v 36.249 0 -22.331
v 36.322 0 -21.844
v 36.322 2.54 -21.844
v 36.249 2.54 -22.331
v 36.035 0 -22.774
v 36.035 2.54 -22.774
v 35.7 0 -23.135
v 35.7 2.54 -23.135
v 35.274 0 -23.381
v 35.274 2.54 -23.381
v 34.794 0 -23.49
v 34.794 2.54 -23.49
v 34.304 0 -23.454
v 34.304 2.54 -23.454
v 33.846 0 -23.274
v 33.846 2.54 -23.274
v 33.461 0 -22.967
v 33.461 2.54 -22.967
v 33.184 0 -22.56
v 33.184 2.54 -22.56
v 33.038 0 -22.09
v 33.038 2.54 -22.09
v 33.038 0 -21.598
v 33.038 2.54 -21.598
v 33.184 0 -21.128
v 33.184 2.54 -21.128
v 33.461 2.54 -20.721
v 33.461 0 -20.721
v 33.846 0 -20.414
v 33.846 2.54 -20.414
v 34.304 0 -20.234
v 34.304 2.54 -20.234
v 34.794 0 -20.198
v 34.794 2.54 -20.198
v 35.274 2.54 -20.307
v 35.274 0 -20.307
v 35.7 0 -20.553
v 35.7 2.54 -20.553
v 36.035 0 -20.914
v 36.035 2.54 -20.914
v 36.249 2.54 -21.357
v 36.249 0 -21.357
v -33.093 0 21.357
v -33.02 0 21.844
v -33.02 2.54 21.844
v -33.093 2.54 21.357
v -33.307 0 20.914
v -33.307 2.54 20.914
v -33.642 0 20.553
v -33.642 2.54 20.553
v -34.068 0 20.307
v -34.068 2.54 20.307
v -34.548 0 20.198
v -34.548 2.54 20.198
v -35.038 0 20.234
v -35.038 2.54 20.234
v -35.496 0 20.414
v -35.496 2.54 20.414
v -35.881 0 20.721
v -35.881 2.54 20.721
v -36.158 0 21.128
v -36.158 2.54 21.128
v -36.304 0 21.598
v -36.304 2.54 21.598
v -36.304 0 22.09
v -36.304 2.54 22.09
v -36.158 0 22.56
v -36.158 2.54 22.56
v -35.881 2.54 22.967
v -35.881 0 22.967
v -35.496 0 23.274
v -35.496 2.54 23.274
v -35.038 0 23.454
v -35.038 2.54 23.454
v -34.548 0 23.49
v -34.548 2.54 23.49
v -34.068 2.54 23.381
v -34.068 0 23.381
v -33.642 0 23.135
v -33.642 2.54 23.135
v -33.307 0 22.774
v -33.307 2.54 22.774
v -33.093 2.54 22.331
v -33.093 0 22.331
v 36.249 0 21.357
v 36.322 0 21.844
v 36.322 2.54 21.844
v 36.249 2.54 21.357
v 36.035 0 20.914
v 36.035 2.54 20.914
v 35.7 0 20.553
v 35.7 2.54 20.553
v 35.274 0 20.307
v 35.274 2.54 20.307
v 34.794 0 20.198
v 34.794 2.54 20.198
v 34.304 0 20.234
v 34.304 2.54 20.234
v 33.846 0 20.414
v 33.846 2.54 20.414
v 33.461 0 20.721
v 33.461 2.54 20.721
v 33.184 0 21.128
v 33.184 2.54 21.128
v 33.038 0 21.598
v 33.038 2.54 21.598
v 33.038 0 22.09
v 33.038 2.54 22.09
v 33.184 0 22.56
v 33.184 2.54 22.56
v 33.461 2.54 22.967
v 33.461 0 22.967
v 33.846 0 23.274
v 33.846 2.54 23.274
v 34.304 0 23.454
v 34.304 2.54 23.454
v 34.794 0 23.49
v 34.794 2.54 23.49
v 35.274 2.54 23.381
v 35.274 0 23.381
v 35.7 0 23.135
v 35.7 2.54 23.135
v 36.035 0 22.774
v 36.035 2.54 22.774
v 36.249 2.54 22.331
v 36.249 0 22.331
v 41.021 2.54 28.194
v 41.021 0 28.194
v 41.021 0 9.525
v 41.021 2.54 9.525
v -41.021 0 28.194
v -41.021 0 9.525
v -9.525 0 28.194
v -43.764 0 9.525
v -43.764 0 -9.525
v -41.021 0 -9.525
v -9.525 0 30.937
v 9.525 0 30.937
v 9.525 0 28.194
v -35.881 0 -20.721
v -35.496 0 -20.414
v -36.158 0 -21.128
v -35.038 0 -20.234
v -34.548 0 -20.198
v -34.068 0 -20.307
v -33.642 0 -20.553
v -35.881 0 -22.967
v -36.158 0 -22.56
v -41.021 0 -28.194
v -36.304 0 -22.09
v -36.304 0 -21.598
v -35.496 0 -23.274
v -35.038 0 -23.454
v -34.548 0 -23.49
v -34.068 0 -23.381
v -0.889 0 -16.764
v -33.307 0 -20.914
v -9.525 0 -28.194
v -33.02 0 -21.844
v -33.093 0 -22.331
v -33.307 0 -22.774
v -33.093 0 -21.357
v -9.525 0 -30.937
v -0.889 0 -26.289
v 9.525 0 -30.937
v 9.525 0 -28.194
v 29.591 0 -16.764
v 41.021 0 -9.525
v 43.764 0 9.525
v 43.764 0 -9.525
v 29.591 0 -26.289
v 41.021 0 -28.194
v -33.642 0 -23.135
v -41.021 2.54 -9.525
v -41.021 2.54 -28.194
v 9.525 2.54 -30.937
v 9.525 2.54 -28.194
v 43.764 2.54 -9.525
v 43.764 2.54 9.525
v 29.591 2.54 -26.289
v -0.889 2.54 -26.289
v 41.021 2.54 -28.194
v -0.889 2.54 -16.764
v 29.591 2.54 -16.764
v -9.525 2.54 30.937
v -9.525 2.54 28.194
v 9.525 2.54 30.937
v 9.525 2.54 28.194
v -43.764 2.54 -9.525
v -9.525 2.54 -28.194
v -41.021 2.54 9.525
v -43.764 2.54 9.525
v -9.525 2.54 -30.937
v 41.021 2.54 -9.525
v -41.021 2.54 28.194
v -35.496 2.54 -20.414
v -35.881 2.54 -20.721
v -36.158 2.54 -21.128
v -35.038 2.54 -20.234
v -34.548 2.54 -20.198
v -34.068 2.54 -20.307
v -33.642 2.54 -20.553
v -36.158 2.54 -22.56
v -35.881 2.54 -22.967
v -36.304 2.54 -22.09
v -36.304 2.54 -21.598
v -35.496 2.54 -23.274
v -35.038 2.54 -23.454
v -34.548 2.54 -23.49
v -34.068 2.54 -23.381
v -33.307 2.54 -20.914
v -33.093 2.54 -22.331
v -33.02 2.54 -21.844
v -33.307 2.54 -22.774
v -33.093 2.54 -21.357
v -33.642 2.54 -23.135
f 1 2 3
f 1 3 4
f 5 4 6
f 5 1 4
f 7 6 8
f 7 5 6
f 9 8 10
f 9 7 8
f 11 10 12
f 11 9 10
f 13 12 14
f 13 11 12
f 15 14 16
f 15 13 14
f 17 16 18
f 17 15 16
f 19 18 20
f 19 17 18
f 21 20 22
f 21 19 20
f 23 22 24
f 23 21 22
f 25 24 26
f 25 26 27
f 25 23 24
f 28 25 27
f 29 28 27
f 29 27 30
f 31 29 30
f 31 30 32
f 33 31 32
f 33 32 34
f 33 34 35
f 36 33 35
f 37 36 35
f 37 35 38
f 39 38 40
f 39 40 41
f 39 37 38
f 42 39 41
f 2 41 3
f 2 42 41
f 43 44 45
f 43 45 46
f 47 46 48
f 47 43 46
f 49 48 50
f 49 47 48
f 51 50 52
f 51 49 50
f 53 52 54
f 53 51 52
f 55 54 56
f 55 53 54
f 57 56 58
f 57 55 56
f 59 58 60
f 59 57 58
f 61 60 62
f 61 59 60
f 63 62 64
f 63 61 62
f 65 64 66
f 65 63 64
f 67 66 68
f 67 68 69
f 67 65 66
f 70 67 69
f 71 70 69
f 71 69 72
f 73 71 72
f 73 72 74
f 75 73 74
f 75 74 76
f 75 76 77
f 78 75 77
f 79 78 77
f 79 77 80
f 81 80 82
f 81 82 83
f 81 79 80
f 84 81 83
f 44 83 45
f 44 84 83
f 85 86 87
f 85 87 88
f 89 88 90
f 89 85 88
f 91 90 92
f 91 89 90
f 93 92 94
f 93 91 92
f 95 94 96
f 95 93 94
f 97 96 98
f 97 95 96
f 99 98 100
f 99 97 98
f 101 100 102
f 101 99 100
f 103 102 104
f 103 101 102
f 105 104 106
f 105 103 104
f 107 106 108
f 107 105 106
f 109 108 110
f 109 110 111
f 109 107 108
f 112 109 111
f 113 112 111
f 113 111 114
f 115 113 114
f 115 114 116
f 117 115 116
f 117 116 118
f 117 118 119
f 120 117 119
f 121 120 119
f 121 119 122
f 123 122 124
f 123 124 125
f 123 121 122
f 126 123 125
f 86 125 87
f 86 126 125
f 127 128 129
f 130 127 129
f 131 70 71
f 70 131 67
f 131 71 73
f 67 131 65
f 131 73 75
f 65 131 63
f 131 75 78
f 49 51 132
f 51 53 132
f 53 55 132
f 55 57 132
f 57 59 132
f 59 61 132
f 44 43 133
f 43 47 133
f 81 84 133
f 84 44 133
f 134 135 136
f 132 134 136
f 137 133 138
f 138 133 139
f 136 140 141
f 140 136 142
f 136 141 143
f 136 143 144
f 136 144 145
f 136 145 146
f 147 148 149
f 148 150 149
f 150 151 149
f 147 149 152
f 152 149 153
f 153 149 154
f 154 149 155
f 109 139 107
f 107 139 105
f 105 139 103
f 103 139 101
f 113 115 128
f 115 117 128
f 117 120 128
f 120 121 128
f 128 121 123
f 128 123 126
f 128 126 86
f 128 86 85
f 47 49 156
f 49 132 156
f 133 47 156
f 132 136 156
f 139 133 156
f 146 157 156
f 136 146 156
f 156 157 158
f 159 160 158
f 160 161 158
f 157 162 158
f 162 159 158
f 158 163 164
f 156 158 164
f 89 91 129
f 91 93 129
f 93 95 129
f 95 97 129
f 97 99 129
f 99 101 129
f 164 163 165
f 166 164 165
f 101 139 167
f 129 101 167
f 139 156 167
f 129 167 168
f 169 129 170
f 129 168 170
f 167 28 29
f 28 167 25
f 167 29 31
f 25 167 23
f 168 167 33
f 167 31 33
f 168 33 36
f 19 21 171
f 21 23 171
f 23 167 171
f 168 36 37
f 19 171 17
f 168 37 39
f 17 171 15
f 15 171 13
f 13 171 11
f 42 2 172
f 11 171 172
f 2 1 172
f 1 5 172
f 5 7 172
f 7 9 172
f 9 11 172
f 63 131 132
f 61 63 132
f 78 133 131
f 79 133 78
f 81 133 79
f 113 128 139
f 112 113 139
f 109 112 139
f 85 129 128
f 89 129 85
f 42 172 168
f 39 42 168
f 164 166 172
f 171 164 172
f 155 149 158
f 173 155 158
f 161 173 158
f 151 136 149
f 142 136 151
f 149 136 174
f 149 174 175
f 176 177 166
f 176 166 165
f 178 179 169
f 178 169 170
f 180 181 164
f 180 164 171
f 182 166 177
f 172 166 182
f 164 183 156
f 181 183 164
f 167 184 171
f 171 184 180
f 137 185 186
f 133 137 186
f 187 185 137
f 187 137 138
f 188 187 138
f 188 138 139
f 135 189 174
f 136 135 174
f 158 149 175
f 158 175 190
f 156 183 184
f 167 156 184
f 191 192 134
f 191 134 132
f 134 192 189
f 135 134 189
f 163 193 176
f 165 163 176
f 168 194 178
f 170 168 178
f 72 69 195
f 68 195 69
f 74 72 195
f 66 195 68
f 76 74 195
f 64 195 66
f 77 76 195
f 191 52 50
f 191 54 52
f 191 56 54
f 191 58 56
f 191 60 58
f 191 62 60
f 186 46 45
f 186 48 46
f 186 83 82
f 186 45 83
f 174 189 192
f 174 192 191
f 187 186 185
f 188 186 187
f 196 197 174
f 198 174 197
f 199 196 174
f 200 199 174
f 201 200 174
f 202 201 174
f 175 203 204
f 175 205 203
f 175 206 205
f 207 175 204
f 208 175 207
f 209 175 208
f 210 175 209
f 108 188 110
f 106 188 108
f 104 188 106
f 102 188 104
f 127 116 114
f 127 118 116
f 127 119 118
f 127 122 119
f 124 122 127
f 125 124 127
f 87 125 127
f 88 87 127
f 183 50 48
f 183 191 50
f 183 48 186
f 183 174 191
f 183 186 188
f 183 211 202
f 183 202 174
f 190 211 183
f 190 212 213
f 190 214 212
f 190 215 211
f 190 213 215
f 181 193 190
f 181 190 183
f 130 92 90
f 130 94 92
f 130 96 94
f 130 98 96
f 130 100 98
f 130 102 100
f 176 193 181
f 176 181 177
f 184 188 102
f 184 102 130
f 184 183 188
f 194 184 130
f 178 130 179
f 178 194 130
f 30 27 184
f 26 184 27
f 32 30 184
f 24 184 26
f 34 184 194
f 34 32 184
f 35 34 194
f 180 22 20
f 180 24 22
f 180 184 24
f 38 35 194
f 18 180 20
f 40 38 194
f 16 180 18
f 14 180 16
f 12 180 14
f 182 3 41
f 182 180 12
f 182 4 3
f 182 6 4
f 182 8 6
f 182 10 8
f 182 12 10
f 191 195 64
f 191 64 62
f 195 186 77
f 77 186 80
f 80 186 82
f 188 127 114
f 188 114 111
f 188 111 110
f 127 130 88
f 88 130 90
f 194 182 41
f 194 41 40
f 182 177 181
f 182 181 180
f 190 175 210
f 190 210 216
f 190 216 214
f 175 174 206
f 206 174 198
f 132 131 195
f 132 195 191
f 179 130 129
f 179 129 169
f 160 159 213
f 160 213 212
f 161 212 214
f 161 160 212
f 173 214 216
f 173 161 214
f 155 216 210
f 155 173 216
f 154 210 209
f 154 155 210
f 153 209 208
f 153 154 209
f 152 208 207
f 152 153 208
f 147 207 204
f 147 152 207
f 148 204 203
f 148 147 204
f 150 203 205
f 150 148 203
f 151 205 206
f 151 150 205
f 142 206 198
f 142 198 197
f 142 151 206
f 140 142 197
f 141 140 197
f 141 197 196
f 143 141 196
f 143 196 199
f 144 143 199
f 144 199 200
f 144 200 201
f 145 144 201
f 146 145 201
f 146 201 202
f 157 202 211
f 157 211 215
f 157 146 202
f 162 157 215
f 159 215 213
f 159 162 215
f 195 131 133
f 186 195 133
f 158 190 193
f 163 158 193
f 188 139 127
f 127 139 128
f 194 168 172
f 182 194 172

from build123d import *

# Parameters (mm, degrees)
SKETCH1_W           = 82.042
SKETCH1_H           = 56.388
SKETCH1_R           = 1.651
BOSS_EXTRUDE1_DEPTH = 2.54
SKETCH2_W           = 19.05
SKETCH2_H           = 2.7432
SKETCH2_W_2         = 2.7432
SKETCH2_H_2         = 19.05
BOSS_EXTRUDE2_DEPTH = 2.54
SKETCH3_W           = 30.48
SKETCH3_H           = 9.525
CUT_EXTRUDE1_DEPTH  = 3.54


with BuildPart() as part:
    # Sketch1 → Boss-Extrude1 (new body)
    with BuildSketch(Plane(origin=(0, 0, 0), x_dir=(1, 0, 0), z_dir=(0, 1, 0))):
        Rectangle(SKETCH1_W, SKETCH1_H)
        with Locations((-34.671, 21.844)):
            Circle(SKETCH1_R, mode=Mode.SUBTRACT)
        with Locations((-34.671, -21.844)):
            Circle(SKETCH1_R, mode=Mode.SUBTRACT)
        with Locations((34.671, -21.844)):
            Circle(SKETCH1_R, mode=Mode.SUBTRACT)
        with Locations((34.671, 21.844)):
            Circle(SKETCH1_R, mode=Mode.SUBTRACT)
    extrude(amount=BOSS_EXTRUDE1_DEPTH)

    # Sketch2 → Boss-Extrude2 (add)
    with BuildSketch(Plane(origin=(0, 2.54, 0), x_dir=(1, 0, 0), z_dir=(0, 1, 0))):
        with Locations((0, 29.5656)):
            Rectangle(SKETCH2_W, SKETCH2_H)
        with Locations((0, -29.5656)):
            Rectangle(SKETCH2_W, SKETCH2_H)
        with Locations((42.3926, 0)):
            Rectangle(SKETCH2_W_2, SKETCH2_H_2)
        with Locations((-42.3926, 0)):
            Rectangle(SKETCH2_W_2, SKETCH2_H_2)
    extrude(amount=-BOSS_EXTRUDE2_DEPTH)

    # Sketch3 → Cut-Extrude1 (cut, through all)
    with BuildSketch(Plane(origin=(0, 2.54, 0), x_dir=(1, 0, 0), z_dir=(0, 1, 0))):
        with Locations((14.351, 21.5265)):
            Rectangle(SKETCH3_W, SKETCH3_H)
    extrude(amount=-CUT_EXTRUDE1_DEPTH, mode=Mode.SUBTRACT)


solid = part.part
